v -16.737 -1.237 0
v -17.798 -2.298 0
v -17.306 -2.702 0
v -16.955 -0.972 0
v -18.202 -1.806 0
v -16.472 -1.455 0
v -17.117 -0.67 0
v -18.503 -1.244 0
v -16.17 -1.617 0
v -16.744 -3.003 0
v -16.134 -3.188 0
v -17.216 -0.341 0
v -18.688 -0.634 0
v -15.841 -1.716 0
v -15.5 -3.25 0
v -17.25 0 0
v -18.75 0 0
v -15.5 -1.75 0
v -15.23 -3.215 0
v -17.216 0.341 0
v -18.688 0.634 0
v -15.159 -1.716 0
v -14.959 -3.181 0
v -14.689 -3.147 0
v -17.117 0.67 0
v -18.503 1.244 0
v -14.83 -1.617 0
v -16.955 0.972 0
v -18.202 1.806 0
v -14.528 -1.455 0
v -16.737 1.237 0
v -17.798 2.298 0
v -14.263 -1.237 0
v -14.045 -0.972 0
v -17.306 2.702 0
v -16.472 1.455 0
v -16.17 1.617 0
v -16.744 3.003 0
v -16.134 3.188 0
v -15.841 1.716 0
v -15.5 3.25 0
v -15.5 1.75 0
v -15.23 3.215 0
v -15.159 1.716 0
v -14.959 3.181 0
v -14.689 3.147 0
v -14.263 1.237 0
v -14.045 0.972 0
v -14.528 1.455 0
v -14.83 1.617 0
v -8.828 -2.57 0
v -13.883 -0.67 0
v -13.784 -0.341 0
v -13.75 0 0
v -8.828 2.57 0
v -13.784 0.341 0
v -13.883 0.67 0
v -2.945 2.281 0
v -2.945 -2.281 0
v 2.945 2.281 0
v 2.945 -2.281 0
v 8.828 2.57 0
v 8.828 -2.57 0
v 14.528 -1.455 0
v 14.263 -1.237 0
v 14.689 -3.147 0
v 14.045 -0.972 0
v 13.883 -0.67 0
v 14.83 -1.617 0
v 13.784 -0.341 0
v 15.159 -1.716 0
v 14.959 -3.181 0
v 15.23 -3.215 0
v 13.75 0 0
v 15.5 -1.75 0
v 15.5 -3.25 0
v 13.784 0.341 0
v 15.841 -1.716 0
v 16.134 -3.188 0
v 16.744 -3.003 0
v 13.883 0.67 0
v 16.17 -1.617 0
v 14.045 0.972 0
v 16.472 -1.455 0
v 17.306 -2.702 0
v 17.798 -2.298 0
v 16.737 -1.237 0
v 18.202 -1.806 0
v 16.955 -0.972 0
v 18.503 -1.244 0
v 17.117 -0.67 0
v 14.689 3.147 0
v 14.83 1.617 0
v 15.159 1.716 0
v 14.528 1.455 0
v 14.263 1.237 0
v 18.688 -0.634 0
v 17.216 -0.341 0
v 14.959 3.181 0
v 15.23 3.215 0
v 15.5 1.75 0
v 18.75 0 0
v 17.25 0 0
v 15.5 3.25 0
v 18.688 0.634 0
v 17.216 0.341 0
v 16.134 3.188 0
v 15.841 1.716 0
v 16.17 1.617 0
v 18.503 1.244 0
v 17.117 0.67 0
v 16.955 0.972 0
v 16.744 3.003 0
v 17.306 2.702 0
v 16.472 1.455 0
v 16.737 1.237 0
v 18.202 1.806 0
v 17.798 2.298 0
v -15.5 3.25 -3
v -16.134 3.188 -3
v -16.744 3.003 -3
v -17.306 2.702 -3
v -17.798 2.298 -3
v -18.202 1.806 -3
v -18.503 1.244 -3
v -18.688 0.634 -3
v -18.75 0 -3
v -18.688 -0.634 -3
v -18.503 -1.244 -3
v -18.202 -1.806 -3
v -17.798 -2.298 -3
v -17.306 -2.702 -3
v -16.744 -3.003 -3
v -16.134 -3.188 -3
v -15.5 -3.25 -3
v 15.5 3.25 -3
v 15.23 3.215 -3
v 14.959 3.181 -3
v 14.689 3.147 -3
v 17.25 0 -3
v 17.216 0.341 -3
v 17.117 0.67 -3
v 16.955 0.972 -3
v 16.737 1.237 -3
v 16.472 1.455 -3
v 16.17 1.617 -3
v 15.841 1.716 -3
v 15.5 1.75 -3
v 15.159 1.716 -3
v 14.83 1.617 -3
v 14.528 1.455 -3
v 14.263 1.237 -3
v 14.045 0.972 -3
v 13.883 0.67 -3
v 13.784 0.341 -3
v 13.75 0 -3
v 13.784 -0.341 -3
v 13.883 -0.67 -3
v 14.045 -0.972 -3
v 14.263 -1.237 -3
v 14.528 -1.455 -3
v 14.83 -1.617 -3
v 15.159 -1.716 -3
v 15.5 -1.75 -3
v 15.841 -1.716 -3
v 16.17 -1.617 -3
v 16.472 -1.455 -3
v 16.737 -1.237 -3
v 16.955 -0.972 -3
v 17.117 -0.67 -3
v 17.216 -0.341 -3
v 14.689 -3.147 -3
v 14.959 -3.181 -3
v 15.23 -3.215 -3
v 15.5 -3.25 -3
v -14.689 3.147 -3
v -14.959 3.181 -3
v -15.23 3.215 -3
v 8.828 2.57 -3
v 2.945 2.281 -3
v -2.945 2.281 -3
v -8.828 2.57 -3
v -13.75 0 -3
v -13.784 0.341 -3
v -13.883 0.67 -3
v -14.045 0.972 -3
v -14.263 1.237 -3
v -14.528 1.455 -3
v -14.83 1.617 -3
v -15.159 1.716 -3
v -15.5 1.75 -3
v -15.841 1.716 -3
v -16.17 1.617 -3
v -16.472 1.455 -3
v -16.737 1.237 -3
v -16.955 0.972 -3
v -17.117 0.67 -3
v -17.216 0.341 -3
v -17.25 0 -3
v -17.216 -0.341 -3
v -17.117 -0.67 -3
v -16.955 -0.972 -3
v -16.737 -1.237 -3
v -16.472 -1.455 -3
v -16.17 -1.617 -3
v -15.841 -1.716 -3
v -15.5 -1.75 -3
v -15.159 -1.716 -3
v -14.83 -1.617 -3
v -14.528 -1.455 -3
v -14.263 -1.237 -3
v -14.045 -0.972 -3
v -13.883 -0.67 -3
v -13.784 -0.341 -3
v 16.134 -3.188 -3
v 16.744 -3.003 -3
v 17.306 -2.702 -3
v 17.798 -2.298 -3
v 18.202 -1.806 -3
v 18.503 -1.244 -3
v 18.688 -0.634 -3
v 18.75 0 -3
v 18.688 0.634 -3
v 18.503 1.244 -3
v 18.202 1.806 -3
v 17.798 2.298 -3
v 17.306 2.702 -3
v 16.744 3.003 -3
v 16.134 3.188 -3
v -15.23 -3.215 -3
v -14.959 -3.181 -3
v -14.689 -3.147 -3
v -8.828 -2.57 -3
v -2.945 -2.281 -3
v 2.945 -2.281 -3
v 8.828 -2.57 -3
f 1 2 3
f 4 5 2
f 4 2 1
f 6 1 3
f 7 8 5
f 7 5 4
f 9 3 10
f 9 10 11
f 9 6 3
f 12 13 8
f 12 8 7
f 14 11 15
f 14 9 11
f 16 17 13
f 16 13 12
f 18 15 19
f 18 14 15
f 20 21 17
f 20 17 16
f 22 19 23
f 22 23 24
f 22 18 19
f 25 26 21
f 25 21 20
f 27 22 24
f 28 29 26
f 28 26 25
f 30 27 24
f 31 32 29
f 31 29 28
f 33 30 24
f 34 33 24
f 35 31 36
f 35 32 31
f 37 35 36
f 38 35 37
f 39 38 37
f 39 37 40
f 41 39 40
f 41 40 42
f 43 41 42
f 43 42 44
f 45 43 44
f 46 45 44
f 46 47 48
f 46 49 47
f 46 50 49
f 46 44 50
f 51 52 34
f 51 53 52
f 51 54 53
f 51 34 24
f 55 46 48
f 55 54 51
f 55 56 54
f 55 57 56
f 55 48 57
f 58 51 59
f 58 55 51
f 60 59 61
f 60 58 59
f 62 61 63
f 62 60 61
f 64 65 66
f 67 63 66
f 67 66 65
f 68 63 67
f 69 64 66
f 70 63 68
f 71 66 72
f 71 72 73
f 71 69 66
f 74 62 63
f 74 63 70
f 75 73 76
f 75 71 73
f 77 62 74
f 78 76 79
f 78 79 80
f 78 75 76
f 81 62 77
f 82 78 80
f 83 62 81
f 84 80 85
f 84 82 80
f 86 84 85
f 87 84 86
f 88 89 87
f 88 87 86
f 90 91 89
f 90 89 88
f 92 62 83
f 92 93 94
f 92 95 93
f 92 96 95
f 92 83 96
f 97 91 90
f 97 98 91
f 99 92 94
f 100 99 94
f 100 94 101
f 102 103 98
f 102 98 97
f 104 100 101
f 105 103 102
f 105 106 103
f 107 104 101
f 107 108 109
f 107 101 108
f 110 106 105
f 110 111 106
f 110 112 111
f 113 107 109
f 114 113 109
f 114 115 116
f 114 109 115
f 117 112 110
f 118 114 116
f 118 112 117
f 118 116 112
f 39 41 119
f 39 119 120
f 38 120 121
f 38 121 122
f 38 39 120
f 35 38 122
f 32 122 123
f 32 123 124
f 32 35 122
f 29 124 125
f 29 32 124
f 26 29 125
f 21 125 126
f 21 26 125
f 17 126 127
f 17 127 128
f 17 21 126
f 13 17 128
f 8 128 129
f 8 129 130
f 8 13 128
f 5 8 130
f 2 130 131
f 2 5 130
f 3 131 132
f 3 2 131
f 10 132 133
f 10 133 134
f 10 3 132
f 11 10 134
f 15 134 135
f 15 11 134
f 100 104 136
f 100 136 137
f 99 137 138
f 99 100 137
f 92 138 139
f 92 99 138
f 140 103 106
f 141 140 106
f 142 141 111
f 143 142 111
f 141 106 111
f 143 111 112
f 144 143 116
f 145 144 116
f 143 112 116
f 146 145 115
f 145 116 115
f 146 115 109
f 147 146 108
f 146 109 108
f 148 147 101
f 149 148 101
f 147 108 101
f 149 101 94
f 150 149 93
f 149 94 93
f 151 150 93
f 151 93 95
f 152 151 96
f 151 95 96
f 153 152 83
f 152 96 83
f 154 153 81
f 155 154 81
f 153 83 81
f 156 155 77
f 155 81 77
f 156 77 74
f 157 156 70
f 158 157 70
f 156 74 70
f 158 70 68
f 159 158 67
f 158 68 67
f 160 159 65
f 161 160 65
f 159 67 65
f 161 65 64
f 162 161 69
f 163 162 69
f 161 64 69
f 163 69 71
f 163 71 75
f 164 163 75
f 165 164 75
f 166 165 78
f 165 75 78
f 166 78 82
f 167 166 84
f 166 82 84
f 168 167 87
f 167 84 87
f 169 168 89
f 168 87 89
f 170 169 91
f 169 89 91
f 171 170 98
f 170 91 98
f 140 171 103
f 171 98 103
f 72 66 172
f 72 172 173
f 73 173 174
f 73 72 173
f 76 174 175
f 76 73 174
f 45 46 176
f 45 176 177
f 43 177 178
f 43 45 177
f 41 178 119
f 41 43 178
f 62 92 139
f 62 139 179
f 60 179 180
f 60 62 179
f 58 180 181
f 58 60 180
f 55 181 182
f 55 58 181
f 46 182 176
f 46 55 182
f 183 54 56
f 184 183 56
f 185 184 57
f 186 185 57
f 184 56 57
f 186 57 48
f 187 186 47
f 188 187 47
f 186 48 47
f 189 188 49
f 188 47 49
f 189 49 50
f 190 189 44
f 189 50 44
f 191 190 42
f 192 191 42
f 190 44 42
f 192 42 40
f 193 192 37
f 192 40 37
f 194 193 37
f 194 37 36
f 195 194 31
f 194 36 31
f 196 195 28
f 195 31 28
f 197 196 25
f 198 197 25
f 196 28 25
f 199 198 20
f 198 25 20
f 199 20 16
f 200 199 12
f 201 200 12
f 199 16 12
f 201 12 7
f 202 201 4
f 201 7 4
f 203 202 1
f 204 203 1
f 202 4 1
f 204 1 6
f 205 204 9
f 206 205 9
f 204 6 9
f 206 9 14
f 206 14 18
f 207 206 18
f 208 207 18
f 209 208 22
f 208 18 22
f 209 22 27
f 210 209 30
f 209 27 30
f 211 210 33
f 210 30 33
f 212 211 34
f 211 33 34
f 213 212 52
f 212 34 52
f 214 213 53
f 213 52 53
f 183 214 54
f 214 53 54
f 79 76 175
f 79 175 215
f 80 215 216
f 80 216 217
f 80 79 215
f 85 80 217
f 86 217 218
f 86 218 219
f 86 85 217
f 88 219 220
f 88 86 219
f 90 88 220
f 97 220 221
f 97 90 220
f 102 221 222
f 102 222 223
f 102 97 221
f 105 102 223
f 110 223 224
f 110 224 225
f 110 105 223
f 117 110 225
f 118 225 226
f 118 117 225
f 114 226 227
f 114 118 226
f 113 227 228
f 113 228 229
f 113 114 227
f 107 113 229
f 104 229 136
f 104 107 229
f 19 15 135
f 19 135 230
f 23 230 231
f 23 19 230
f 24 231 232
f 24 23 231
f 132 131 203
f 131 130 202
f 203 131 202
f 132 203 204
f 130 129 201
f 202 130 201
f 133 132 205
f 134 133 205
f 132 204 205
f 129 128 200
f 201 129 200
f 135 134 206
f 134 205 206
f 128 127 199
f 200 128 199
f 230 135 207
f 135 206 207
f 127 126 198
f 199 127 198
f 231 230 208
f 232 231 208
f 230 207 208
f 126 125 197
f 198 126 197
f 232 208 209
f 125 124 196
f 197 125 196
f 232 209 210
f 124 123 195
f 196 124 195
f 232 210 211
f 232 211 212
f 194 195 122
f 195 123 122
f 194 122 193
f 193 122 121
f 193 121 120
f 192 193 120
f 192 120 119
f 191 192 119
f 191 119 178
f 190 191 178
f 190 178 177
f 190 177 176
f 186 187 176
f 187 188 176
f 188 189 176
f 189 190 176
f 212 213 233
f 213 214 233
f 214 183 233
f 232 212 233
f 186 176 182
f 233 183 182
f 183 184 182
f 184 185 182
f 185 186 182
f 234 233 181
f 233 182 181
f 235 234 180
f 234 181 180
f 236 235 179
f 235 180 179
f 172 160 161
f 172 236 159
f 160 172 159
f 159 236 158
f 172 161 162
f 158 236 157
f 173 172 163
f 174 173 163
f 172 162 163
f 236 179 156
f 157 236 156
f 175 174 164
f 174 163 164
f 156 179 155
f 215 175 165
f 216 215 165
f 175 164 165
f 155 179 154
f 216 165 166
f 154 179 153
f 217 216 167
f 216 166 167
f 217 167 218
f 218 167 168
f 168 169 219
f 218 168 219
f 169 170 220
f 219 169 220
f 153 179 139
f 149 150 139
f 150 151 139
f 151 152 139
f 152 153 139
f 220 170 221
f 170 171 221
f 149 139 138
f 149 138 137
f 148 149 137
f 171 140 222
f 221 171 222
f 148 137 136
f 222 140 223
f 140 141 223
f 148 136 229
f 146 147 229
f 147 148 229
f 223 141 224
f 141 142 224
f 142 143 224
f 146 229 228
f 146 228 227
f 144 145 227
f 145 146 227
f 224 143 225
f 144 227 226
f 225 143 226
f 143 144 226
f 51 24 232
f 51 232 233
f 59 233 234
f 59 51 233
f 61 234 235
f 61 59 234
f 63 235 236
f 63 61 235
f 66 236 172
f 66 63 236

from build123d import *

# Parameters (mm, degrees)
SKETCH1_R           = 1.75
BOSS_EXTRUDE1_DEPTH = 3


with BuildPart() as part:
    # Sketch1 → Boss-Extrude1 (new body)
    with BuildSketch(Plane.XY):
        with BuildLine():
            ThreePointArc((14.688874122, 3.147153446), (0, 2.244747783), (-14.688874122, 3.147153446))
            ThreePointArc((-14.688874122, 3.147153446), (-15.094524654, 3.197885895), (-15.5, 3.25))
            ThreePointArc((-15.5, 3.25), (-18.75, 0), (-15.5, -3.25))
            ThreePointArc((-15.5, -3.25), (-15.094524654, -3.197885895), (-14.688874122, -3.147153446))
            ThreePointArc((-14.688874122, -3.147153446), (0, -2.244747783), (14.688874122, -3.147153446))
            ThreePointArc((14.688874122, -3.147153446), (15.094524654, -3.197885895), (15.5, -3.25))
            ThreePointArc((15.5, -3.25), (18.75, 0), (15.5, 3.25))
            ThreePointArc((15.5, 3.25), (15.094524654, 3.197885895), (14.688874122, 3.147153446))
        make_face()
        with Locations((-15.5, 0)):
            Circle(SKETCH1_R, mode=Mode.SUBTRACT)
        with Locations((15.5, 0)):
            Circle(SKETCH1_R, mode=Mode.SUBTRACT)
    extrude(amount=-BOSS_EXTRUDE1_DEPTH)


solid = part.part
